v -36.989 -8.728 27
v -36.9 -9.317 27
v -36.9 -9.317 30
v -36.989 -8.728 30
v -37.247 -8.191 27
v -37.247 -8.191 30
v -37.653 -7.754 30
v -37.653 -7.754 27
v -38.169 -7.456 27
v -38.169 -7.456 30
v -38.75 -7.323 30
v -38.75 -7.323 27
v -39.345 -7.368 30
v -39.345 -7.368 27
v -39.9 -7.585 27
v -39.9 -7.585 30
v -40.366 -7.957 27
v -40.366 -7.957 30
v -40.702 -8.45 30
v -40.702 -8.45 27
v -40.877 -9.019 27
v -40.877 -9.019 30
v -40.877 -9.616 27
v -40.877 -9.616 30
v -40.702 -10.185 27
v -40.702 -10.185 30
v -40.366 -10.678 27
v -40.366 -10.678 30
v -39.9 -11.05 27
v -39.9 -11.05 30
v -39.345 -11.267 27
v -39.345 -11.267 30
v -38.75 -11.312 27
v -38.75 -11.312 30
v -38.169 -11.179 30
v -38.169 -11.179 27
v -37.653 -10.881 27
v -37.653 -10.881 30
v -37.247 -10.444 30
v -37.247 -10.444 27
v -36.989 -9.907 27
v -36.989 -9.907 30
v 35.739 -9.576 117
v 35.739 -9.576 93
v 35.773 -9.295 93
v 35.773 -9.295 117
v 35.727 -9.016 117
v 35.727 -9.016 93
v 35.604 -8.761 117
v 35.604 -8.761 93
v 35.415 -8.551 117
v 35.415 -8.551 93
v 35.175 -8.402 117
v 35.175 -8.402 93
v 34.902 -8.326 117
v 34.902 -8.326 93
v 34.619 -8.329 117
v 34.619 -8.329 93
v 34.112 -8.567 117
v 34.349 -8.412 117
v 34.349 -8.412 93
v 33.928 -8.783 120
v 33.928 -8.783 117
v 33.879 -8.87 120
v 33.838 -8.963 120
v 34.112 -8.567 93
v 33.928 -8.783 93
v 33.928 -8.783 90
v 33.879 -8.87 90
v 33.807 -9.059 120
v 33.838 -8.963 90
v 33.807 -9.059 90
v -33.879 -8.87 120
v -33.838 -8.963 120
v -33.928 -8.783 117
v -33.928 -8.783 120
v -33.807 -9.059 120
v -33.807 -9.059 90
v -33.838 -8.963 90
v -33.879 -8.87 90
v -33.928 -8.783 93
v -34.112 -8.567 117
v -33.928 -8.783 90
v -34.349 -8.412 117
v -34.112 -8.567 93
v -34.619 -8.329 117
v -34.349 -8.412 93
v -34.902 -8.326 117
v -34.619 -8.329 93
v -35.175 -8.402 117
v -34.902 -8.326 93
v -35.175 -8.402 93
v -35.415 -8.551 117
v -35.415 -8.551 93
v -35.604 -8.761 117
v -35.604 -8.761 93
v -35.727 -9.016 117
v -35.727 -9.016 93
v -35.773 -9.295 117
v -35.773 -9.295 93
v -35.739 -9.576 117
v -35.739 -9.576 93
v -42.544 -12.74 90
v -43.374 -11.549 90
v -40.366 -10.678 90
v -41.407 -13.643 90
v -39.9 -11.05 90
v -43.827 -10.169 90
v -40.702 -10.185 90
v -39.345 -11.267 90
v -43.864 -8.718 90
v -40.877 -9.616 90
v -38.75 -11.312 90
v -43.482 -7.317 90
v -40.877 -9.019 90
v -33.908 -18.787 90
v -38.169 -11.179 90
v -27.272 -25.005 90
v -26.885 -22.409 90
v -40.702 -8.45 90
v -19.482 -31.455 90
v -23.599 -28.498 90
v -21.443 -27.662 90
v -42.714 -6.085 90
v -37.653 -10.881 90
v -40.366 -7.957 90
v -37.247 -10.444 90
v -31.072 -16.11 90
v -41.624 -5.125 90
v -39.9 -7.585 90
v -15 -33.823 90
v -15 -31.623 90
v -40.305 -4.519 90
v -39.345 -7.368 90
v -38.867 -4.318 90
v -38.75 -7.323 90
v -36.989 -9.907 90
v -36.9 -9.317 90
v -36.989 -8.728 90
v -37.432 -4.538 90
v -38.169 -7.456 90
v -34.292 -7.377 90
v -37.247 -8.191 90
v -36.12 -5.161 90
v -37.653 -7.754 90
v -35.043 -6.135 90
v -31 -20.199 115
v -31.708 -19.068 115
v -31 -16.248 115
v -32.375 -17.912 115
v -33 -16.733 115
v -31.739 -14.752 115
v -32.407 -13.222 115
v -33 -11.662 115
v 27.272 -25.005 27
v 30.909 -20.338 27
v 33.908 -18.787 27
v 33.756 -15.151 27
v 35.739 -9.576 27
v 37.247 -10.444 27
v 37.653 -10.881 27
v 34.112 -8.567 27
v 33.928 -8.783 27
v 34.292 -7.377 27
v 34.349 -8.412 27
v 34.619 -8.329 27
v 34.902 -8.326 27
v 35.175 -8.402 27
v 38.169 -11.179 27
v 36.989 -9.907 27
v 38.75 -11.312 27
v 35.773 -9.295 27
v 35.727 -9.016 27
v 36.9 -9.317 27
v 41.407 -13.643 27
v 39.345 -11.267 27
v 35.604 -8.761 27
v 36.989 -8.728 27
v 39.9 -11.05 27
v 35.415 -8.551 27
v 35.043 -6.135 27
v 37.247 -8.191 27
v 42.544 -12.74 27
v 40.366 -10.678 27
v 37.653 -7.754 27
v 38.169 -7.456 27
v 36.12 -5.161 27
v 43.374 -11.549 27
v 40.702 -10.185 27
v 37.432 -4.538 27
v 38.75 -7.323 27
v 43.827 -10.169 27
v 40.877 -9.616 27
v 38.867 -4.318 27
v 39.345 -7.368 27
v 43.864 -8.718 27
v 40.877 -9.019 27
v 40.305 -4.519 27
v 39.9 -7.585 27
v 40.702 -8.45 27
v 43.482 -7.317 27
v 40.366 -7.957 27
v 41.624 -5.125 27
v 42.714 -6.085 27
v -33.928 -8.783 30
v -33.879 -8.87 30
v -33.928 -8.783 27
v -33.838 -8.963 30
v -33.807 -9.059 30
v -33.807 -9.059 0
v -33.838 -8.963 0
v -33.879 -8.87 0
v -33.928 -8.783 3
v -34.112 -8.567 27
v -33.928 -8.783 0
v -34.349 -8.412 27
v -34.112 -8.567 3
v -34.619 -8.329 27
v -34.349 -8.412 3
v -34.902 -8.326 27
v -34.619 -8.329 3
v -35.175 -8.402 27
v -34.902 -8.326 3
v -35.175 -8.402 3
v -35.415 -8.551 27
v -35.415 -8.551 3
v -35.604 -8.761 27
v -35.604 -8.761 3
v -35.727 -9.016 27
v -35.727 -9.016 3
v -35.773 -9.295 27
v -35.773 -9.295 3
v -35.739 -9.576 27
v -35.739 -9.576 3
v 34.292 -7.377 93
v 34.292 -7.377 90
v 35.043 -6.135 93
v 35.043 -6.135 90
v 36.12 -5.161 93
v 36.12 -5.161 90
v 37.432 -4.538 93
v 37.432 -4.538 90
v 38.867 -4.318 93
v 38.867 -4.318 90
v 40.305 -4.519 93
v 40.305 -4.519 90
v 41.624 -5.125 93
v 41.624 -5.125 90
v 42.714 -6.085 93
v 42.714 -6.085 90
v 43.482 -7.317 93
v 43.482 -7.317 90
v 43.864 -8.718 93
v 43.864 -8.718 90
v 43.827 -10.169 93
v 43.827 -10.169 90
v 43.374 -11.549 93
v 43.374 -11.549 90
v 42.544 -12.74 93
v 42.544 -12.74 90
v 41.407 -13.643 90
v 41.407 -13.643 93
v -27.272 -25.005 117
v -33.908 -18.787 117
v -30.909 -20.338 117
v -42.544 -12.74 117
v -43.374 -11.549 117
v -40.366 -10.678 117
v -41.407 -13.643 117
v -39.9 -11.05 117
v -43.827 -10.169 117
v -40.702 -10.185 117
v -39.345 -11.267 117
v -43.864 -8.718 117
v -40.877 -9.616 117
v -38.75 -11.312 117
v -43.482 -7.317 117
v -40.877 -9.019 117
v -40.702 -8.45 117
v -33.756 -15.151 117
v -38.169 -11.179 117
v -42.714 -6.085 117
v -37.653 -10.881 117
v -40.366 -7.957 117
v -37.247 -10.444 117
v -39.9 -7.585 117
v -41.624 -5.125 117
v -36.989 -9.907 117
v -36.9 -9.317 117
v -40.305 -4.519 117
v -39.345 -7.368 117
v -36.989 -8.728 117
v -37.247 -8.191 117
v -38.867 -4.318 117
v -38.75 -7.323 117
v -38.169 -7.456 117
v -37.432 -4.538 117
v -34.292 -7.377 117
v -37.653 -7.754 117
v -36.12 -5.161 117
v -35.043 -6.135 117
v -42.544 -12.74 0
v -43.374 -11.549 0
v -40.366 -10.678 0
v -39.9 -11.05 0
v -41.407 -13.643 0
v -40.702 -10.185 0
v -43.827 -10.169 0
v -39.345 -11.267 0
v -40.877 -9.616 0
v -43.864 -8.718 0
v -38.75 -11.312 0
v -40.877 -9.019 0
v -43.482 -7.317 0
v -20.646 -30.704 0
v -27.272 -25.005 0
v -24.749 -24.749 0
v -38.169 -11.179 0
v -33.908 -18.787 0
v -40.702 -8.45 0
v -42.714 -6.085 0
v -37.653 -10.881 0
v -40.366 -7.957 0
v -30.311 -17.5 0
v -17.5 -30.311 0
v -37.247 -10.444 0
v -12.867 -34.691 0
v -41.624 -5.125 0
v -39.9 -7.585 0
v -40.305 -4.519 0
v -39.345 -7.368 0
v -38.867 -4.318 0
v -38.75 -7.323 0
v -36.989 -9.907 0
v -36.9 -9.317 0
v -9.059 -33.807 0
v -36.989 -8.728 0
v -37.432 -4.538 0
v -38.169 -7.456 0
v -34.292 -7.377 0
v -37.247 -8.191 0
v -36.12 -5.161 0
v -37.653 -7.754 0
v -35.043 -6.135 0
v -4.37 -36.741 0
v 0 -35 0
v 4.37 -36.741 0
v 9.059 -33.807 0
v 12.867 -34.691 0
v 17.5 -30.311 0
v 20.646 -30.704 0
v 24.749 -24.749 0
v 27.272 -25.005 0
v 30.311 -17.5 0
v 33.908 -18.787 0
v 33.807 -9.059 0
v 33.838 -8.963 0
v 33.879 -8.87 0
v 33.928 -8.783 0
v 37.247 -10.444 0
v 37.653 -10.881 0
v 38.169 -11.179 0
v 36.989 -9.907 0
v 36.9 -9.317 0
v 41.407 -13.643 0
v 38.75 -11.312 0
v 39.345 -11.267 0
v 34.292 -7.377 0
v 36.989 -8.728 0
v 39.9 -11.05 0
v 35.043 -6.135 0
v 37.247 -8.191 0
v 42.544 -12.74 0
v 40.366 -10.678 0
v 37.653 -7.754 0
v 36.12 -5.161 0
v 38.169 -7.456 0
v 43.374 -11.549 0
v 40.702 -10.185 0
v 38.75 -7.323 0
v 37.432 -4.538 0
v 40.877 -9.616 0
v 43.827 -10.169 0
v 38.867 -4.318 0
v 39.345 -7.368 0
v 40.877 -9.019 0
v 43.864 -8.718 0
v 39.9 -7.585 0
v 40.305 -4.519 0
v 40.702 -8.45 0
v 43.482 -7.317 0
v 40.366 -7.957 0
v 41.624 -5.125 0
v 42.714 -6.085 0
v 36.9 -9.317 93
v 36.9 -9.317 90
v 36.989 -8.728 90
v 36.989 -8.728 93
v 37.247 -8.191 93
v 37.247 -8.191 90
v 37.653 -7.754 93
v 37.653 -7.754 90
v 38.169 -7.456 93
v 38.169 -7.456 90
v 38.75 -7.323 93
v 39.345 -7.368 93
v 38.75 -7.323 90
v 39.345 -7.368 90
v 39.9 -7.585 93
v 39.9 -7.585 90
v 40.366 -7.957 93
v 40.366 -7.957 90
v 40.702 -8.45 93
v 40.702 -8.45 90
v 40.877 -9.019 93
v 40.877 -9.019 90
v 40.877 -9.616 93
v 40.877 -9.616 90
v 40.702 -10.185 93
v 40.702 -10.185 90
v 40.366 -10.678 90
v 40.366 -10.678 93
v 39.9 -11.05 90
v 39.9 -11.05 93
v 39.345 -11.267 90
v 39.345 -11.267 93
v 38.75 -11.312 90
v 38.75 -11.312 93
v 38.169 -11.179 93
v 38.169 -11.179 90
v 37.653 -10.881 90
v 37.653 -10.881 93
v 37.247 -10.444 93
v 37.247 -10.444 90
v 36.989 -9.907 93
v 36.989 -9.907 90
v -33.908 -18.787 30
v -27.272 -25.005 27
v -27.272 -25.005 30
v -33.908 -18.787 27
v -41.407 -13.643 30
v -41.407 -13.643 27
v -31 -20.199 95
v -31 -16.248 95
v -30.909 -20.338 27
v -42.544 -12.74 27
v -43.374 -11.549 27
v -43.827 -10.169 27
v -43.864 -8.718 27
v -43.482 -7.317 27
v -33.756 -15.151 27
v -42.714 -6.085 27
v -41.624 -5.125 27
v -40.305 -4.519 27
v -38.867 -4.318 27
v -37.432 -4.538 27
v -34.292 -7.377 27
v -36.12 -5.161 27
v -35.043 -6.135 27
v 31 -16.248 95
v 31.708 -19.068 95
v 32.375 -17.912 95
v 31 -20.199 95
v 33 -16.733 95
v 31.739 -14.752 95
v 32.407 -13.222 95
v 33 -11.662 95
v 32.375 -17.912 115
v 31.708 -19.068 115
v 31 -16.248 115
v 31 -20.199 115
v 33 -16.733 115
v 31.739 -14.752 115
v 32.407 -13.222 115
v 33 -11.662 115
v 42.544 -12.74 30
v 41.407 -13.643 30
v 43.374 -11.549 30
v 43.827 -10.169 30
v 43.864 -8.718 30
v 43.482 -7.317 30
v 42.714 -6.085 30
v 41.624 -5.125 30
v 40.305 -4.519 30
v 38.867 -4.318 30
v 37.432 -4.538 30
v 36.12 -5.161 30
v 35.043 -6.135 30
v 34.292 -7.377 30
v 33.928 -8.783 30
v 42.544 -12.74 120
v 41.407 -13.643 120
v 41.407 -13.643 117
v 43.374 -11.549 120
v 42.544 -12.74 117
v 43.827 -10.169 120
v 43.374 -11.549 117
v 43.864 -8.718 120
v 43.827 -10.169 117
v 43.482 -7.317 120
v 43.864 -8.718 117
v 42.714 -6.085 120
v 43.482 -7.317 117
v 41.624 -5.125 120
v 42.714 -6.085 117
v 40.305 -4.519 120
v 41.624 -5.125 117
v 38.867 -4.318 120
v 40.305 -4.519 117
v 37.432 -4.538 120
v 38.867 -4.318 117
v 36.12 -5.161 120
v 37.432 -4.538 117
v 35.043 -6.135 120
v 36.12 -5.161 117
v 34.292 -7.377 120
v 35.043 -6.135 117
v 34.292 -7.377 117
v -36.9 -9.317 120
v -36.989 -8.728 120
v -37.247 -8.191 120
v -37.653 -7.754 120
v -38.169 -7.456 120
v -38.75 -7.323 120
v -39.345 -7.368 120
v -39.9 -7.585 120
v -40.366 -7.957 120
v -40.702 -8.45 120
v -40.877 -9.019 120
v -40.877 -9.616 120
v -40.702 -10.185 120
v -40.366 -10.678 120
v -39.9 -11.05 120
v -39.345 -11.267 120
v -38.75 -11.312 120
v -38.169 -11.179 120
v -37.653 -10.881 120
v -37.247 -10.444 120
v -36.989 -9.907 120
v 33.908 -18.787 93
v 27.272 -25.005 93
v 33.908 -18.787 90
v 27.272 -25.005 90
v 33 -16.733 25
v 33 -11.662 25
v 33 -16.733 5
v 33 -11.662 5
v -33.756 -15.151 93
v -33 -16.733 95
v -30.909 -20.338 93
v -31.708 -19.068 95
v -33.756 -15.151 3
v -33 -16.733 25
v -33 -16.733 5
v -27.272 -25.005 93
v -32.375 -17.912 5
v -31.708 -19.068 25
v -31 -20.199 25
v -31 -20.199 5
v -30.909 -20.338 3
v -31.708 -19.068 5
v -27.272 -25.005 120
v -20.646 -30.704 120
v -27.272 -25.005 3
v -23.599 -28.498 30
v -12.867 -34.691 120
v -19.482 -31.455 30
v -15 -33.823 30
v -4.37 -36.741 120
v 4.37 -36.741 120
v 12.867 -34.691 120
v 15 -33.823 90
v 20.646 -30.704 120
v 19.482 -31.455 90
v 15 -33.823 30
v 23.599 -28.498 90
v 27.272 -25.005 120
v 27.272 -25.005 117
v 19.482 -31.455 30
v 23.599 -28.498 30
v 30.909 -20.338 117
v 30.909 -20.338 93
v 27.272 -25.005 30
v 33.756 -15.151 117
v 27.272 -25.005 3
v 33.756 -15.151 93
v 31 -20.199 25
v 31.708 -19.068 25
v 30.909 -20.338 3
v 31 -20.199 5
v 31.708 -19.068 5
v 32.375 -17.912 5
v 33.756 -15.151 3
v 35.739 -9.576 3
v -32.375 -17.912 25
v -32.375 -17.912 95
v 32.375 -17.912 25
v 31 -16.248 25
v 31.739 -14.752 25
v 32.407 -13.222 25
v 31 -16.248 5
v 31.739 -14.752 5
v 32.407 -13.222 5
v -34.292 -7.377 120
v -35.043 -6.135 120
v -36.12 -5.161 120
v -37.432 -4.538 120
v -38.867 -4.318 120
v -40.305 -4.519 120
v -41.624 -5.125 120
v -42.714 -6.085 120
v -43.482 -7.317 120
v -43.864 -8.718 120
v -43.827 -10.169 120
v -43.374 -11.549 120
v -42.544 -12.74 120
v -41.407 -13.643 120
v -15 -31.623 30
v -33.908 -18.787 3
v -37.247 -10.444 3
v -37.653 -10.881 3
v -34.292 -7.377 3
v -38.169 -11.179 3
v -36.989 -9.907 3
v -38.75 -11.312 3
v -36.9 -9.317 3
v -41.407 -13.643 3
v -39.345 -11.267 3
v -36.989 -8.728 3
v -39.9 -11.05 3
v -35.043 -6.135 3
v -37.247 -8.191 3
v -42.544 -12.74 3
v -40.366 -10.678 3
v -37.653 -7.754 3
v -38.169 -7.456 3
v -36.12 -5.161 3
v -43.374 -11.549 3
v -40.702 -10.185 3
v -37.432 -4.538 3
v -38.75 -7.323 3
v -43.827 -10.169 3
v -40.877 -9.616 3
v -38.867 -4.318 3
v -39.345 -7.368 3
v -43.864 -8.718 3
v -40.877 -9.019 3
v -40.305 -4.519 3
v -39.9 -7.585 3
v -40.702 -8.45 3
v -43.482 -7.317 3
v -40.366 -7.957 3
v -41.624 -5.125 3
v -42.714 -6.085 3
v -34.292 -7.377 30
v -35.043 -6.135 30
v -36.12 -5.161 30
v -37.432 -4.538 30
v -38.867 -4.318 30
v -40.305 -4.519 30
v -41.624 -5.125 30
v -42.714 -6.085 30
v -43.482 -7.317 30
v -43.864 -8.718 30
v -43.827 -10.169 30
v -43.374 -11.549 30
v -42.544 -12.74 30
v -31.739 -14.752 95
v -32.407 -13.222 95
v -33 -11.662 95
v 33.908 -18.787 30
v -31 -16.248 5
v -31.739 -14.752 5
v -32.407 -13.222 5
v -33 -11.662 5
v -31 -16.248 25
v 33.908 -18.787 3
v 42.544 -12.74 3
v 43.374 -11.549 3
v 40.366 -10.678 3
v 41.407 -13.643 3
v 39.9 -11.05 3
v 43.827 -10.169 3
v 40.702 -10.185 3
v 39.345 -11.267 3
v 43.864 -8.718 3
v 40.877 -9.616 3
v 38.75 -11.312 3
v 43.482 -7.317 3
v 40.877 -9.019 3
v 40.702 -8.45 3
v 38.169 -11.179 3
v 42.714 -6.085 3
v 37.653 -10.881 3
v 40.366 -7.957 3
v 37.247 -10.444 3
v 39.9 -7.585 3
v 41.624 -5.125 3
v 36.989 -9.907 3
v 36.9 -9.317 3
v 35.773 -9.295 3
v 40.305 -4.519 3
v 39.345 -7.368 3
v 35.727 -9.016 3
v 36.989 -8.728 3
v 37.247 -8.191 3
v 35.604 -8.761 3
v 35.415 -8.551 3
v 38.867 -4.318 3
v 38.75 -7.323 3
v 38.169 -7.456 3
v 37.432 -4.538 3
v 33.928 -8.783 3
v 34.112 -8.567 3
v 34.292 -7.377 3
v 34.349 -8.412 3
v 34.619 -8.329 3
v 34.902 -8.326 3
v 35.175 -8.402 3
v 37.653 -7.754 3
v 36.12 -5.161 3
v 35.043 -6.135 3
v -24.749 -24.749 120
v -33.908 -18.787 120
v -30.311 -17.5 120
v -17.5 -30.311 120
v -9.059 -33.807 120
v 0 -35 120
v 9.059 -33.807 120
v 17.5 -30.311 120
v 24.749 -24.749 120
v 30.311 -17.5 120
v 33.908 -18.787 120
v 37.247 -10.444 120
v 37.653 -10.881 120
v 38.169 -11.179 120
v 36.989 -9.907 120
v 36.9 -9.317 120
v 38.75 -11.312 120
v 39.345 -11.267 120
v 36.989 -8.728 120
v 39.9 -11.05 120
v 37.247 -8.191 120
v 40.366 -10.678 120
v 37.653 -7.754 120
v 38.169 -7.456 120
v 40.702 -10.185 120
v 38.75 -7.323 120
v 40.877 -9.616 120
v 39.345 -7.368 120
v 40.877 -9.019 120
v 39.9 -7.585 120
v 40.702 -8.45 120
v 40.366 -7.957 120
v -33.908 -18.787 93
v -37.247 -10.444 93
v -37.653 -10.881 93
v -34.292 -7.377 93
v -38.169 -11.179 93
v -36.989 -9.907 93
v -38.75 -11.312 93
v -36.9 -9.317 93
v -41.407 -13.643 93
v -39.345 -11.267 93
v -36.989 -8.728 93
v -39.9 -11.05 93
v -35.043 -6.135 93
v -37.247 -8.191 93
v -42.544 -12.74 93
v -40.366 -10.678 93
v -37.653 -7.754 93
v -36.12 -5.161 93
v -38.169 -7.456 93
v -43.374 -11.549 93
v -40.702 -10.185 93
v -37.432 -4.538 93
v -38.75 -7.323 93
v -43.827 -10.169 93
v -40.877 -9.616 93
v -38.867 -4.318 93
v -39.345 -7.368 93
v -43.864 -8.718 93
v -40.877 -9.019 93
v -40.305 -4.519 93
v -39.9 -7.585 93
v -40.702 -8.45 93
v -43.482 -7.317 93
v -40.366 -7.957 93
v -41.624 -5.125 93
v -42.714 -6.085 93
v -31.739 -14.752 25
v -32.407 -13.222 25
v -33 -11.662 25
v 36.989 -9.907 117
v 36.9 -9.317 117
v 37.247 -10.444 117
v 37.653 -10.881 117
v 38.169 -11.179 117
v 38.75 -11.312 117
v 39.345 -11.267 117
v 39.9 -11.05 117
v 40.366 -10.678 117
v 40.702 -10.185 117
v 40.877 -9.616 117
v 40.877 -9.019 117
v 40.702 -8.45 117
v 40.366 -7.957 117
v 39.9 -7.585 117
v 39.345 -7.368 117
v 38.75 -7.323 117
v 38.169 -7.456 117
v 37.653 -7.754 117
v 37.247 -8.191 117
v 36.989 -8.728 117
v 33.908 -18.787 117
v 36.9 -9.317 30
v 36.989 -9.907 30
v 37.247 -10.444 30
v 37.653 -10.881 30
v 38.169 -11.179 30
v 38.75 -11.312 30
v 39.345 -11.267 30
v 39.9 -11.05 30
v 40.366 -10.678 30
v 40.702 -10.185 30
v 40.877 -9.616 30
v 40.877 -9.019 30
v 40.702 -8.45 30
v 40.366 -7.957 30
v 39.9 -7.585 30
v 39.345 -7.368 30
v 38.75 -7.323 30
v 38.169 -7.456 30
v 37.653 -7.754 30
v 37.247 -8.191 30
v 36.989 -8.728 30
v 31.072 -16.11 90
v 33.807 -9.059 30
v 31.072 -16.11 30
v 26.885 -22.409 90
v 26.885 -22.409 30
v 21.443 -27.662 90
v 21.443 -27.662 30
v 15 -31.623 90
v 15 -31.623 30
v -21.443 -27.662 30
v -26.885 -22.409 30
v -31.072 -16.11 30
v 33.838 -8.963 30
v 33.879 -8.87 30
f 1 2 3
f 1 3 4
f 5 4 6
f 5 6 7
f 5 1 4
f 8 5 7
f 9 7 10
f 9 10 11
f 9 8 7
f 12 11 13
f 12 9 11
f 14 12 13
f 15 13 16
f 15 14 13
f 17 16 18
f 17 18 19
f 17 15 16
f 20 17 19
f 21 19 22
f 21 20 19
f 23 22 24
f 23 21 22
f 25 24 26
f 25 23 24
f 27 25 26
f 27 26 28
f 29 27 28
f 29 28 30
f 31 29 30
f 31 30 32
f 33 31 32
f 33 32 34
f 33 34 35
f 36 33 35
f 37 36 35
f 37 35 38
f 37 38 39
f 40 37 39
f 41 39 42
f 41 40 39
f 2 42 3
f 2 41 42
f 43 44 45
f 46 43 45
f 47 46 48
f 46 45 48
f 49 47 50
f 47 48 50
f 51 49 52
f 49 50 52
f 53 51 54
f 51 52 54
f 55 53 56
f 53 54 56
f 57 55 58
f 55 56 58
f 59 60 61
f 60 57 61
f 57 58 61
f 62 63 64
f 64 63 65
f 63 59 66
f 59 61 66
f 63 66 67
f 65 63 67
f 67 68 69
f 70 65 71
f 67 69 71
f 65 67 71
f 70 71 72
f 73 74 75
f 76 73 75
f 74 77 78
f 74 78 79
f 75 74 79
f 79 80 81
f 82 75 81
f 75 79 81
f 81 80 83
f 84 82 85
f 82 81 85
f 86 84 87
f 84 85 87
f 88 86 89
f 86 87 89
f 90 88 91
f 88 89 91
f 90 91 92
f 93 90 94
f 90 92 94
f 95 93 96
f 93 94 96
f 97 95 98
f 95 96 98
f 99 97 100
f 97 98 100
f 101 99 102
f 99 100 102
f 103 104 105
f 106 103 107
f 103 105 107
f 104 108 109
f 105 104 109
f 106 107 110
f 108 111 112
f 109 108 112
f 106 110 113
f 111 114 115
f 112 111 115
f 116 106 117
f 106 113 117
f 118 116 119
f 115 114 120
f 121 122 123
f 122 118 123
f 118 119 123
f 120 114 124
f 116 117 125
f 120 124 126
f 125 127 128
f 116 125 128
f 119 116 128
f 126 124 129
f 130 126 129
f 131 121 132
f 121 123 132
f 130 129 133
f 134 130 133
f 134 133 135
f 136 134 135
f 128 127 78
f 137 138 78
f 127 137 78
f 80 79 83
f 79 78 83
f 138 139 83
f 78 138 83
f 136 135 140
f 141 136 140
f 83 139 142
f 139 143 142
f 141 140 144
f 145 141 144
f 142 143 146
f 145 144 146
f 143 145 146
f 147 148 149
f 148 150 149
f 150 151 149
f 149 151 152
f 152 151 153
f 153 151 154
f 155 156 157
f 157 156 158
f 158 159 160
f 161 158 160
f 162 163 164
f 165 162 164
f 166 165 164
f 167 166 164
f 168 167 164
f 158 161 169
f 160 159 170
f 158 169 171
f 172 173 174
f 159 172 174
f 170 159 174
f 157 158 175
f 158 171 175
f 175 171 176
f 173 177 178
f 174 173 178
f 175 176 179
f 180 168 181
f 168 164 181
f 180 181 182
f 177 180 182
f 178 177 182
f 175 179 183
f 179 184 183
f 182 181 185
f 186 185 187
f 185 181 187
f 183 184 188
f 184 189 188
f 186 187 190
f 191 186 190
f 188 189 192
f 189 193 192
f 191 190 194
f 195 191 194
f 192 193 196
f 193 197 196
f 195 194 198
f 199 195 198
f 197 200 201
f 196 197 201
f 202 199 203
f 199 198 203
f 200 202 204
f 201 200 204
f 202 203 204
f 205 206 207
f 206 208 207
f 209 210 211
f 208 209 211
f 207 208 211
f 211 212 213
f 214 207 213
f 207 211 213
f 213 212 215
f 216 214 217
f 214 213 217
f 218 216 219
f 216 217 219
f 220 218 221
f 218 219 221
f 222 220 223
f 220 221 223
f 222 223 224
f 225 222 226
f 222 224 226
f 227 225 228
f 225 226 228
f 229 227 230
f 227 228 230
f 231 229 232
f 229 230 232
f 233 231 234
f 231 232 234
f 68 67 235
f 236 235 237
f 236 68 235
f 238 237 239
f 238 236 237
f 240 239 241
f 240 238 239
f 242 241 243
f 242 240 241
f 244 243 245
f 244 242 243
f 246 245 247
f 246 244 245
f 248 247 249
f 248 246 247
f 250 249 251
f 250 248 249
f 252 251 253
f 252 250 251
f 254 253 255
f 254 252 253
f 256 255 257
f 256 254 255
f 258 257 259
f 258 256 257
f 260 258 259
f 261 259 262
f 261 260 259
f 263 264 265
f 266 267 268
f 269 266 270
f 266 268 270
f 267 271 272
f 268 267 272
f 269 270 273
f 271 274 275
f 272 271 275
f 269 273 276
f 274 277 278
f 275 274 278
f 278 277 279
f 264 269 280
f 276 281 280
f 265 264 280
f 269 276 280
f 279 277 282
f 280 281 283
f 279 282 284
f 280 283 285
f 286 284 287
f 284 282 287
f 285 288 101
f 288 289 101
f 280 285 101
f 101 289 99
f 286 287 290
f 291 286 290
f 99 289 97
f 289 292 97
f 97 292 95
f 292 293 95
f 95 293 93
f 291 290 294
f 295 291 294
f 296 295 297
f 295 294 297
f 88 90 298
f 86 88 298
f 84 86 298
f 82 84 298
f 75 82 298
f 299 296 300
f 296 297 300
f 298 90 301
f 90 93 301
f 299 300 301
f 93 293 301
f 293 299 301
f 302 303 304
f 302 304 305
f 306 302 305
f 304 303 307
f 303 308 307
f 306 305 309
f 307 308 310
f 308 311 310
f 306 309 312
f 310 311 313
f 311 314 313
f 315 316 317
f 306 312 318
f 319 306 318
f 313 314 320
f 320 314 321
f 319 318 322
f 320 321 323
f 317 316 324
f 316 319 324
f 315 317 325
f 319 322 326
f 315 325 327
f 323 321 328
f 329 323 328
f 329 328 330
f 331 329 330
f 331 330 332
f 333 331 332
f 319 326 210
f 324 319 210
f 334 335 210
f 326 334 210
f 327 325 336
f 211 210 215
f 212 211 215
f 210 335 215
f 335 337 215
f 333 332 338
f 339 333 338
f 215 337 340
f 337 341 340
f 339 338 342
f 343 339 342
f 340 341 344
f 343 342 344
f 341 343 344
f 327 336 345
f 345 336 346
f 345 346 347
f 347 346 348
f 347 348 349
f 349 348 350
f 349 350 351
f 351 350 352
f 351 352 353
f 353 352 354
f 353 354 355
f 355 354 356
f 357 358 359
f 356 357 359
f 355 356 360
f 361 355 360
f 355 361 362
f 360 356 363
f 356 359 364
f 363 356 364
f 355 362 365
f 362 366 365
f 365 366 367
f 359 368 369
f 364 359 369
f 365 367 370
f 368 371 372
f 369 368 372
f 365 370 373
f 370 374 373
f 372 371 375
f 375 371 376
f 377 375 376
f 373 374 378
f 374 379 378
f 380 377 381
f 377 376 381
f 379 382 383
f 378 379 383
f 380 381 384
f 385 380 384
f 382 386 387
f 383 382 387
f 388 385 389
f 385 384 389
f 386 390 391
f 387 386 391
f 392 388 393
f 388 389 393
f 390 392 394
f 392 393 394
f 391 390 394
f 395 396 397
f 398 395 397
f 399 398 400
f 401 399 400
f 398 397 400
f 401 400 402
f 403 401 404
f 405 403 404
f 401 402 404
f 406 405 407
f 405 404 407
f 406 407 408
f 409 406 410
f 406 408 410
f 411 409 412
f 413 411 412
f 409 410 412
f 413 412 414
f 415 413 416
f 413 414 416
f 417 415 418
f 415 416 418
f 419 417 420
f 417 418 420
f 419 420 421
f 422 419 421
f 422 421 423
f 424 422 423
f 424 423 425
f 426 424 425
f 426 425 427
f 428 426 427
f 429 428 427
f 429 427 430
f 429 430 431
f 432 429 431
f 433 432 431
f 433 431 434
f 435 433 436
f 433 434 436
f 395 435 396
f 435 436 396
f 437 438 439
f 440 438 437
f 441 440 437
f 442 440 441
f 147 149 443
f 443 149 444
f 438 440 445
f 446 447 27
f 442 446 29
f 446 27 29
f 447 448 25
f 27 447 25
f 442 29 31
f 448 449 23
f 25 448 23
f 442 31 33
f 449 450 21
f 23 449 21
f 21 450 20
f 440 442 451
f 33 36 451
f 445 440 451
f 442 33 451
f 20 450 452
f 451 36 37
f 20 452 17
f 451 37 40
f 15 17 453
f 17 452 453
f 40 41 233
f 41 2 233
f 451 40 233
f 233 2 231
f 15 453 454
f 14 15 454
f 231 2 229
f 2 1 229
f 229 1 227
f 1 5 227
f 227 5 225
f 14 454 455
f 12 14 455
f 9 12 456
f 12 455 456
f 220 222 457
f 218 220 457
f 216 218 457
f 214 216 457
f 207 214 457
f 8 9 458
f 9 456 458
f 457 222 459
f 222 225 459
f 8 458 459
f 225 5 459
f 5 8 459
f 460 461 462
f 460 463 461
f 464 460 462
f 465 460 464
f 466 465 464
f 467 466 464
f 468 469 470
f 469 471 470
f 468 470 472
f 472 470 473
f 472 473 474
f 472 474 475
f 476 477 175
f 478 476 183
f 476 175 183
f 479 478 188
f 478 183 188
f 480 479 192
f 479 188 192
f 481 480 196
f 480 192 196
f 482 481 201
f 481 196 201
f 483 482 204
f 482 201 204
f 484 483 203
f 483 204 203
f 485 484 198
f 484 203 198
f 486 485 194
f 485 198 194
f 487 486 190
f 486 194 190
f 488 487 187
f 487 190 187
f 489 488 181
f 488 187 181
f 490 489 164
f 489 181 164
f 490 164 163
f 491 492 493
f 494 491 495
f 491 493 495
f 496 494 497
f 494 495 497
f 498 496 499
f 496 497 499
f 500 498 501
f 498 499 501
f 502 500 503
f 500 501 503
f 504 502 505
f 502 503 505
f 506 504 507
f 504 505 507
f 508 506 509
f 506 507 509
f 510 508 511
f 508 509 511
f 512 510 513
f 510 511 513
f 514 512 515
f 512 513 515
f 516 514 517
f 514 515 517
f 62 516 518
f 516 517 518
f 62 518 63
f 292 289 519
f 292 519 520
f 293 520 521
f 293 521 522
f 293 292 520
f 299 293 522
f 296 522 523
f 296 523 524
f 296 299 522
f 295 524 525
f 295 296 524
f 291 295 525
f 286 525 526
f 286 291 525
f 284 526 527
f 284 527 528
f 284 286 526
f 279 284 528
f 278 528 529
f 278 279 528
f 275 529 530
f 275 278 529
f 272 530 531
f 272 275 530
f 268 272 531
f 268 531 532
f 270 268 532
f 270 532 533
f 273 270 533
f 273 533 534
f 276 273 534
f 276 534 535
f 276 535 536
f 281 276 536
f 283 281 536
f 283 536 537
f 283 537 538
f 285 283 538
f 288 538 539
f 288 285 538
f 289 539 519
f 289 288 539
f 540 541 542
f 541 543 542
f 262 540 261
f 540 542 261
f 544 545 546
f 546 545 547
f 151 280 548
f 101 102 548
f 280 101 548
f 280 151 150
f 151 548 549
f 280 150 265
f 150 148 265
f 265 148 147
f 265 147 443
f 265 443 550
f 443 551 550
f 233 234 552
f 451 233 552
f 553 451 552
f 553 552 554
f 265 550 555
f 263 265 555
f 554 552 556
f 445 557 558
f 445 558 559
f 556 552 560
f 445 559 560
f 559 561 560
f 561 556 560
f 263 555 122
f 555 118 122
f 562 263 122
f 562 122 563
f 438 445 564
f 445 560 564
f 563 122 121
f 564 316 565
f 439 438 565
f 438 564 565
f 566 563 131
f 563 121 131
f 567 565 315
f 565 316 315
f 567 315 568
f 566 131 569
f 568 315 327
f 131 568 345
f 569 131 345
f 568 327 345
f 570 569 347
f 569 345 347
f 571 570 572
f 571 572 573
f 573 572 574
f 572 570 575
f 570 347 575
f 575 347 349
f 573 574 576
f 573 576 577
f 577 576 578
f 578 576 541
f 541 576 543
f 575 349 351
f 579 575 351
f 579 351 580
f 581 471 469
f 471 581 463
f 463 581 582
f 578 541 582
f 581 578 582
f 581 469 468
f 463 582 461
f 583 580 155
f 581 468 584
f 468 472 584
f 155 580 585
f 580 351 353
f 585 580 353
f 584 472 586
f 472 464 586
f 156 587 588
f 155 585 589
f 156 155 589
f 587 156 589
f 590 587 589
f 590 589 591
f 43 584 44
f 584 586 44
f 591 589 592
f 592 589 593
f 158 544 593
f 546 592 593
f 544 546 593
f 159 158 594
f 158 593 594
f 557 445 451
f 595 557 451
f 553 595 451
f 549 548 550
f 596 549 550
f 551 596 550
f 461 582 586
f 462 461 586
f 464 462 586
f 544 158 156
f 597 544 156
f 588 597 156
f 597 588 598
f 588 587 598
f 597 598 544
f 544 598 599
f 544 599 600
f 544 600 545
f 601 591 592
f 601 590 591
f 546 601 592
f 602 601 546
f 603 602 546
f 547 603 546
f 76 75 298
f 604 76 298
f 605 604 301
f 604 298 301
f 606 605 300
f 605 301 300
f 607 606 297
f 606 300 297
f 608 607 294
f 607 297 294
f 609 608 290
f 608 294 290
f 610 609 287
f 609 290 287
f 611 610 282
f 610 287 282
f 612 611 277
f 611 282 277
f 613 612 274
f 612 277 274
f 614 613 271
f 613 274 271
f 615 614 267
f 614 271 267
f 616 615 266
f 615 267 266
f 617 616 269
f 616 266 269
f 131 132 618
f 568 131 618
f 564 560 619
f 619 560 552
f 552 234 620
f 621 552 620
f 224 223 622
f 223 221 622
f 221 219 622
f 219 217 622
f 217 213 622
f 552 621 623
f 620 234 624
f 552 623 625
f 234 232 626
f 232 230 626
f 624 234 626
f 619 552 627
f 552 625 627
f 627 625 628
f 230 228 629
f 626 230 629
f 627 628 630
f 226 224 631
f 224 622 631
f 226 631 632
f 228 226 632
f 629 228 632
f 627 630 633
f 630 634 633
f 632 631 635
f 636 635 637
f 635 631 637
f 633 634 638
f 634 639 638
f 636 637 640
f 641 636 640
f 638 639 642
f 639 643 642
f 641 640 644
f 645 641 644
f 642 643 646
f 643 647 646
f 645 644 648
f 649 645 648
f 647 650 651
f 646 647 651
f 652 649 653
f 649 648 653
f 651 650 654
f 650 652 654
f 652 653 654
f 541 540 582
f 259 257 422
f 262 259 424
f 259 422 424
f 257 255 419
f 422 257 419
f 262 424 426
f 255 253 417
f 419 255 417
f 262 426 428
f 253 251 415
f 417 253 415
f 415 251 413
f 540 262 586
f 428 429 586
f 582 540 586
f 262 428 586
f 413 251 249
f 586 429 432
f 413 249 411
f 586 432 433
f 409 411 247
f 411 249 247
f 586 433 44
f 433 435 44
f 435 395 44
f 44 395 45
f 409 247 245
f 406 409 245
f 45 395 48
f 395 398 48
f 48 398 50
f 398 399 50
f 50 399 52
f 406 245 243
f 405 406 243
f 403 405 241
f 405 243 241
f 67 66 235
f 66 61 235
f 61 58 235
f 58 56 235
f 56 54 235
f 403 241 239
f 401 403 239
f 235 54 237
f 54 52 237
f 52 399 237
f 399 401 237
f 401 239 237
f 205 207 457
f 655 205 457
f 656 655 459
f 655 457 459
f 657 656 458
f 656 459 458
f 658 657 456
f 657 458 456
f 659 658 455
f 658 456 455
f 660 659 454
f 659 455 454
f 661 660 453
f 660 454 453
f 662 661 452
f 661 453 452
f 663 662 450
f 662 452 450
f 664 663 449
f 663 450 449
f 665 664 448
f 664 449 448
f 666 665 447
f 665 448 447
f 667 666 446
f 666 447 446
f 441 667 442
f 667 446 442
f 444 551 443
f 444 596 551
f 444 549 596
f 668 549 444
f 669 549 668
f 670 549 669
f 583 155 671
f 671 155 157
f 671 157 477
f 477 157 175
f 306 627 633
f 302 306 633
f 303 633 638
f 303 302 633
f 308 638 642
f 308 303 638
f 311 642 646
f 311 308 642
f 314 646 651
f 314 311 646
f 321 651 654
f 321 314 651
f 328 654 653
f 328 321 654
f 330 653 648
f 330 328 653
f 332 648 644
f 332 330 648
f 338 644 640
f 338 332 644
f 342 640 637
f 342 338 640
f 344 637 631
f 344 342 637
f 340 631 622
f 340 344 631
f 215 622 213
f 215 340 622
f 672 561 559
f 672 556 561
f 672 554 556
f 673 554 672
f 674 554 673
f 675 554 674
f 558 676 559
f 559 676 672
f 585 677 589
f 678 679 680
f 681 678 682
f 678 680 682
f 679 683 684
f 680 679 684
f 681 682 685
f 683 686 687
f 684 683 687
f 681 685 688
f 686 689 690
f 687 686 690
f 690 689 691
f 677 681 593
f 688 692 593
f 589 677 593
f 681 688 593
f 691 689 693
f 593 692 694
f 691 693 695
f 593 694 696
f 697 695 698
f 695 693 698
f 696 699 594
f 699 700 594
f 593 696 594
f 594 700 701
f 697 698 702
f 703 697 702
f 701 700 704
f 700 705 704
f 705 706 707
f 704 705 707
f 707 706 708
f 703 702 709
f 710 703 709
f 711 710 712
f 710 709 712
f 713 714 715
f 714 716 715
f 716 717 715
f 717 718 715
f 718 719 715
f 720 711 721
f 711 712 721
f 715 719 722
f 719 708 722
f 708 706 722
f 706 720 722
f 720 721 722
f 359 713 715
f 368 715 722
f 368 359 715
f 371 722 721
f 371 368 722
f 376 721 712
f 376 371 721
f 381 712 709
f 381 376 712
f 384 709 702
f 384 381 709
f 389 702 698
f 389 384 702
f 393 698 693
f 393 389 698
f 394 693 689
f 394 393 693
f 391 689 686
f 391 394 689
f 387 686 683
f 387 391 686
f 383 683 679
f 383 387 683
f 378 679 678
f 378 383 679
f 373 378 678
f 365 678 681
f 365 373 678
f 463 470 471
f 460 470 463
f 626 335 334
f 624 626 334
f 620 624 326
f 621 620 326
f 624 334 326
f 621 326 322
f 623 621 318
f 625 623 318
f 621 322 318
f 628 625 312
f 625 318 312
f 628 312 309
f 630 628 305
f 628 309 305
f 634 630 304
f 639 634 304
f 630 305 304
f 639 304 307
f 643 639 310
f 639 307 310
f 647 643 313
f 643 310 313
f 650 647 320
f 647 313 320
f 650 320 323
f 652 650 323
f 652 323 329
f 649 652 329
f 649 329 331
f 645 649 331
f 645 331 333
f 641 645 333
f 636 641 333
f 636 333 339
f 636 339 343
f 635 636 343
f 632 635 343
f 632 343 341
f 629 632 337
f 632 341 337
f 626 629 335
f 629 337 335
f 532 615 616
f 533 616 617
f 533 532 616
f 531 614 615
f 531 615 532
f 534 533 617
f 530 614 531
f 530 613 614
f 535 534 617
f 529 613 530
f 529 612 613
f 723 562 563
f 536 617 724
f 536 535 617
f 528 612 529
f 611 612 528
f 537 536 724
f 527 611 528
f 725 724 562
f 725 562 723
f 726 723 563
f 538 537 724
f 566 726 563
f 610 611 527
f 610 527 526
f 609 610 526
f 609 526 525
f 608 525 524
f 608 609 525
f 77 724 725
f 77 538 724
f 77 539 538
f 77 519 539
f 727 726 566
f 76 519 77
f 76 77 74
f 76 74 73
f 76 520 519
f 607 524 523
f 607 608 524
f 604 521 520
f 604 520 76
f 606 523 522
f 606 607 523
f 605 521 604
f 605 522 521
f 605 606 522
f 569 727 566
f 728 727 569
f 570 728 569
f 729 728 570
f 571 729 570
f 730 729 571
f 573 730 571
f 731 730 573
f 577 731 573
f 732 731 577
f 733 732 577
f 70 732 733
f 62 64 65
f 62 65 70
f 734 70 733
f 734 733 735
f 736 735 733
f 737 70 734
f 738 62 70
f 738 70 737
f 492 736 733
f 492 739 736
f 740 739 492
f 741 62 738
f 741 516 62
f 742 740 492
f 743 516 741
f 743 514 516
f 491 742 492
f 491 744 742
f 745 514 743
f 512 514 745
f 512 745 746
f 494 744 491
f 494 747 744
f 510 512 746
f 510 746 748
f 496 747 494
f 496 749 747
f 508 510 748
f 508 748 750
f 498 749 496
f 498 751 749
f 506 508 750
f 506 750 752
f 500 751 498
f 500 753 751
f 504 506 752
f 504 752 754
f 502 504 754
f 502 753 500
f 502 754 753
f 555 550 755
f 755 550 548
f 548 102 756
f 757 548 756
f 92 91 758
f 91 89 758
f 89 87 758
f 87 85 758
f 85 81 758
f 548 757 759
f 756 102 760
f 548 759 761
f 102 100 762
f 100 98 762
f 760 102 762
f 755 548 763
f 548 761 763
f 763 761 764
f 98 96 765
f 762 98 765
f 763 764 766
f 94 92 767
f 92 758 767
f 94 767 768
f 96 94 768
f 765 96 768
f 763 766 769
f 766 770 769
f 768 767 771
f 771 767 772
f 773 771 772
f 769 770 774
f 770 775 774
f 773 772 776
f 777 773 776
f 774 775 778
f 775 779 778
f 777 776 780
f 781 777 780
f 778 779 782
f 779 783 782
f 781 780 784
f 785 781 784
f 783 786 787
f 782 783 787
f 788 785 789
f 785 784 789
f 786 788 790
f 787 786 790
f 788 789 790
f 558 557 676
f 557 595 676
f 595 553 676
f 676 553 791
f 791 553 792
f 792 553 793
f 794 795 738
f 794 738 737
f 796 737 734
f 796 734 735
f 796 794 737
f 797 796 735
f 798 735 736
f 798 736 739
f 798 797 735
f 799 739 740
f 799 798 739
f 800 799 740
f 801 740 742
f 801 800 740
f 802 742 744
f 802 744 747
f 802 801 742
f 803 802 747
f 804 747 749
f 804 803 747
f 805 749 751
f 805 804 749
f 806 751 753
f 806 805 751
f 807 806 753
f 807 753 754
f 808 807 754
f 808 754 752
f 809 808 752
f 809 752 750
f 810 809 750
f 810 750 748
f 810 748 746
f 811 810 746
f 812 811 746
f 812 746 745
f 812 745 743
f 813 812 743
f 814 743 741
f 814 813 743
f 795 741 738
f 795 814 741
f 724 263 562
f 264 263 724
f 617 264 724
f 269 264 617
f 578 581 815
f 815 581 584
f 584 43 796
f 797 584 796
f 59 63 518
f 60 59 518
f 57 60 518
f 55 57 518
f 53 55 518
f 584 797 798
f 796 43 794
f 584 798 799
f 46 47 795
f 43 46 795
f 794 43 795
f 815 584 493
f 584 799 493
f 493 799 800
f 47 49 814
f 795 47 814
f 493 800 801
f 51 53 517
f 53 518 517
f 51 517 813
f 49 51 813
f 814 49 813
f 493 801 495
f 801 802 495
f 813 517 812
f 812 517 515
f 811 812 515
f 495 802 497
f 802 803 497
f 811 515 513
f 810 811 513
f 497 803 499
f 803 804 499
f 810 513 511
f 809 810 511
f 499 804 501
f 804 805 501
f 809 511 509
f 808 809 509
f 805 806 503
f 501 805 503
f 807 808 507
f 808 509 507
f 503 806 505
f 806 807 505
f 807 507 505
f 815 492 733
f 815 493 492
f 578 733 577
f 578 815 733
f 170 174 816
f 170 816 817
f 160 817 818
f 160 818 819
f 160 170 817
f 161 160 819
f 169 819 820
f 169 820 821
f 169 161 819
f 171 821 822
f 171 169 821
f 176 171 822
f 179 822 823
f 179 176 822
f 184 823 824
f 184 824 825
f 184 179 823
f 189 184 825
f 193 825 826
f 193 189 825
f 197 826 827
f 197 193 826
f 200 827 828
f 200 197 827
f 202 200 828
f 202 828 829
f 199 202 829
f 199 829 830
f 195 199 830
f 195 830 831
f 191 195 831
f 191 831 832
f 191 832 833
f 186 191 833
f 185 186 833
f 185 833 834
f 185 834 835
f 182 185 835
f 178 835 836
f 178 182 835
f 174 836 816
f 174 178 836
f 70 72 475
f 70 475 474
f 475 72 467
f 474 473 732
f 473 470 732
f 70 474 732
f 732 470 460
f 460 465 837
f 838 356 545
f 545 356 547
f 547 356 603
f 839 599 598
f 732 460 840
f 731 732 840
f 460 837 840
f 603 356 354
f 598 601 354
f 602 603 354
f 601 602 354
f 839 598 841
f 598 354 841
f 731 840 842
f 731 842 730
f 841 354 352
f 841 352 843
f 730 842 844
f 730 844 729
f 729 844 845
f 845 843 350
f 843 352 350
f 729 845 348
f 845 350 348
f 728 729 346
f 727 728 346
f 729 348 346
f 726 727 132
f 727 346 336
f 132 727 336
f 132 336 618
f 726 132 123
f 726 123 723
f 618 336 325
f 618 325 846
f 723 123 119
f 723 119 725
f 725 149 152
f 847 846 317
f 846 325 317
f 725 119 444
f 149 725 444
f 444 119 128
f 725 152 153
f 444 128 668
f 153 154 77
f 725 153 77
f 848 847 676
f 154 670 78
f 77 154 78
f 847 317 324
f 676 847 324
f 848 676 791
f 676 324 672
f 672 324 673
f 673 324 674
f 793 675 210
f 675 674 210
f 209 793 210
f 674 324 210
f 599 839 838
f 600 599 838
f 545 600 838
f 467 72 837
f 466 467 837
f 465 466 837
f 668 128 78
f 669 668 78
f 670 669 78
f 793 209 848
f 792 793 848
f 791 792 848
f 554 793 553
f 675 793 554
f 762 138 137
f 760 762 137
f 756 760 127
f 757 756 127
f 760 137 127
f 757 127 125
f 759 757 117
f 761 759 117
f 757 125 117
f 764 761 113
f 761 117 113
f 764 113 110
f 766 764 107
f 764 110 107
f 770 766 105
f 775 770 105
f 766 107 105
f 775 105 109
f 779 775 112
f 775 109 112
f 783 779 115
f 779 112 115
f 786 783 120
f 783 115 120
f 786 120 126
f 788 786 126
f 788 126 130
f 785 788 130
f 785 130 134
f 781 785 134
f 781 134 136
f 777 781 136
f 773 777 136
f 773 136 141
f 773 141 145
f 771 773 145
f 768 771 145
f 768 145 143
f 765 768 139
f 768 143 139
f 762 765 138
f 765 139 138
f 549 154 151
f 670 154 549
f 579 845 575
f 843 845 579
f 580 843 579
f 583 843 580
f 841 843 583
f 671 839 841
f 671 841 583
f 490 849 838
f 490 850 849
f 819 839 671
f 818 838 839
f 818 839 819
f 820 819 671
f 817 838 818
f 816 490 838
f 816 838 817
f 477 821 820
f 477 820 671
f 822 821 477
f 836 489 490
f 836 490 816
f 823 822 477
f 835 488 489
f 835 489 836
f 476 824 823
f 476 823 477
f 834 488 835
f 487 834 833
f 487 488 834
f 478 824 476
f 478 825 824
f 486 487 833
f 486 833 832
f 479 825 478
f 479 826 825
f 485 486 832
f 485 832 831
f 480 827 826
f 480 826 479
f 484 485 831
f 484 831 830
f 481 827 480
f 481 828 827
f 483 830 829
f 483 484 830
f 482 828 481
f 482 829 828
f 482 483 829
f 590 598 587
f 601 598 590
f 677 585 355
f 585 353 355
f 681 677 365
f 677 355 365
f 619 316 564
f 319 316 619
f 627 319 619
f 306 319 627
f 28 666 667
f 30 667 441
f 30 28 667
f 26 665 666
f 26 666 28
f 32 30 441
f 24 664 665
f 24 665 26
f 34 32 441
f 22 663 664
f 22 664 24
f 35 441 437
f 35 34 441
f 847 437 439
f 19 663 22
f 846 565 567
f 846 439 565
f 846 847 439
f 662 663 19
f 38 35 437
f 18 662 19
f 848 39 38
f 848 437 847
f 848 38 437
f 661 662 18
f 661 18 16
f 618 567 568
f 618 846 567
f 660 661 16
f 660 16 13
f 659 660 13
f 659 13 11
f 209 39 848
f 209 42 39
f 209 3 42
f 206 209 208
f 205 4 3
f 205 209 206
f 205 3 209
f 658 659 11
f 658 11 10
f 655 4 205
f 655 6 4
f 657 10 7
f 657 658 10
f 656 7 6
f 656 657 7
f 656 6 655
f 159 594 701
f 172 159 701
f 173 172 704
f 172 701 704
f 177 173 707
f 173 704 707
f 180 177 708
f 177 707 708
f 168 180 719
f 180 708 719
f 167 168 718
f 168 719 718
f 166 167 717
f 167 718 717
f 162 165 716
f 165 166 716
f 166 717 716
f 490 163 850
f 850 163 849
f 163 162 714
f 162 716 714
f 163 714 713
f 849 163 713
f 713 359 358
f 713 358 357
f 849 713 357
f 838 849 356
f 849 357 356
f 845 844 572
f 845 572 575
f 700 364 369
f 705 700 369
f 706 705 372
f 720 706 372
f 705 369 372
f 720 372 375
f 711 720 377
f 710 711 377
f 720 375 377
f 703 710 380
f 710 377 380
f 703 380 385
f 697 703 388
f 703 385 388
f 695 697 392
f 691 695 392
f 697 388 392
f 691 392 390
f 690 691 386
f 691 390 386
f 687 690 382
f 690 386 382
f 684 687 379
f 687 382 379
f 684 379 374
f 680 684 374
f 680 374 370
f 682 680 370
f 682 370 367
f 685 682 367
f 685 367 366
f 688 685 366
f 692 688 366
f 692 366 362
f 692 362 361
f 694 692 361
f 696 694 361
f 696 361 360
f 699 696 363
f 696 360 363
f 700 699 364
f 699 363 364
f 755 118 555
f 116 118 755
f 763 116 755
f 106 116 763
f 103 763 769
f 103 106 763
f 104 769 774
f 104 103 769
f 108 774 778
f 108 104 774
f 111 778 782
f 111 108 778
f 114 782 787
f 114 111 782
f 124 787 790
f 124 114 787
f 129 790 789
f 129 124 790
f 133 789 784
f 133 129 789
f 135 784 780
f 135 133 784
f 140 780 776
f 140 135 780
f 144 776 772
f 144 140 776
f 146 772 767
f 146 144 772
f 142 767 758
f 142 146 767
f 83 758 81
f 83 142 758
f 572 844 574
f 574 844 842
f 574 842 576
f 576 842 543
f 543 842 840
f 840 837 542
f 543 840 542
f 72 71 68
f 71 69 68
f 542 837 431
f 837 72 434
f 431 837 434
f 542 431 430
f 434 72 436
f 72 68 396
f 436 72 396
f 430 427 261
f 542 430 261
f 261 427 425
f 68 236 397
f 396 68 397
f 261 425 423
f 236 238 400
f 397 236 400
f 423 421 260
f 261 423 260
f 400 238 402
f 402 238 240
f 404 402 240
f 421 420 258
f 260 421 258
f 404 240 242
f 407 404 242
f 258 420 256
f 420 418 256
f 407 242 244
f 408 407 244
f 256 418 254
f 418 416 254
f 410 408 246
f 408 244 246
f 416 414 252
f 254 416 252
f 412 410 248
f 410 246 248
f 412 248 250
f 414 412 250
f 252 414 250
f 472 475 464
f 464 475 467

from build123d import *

# Parameters (mm, degrees)
BOSS_EXTRUDE1_DEPTH = 120
SKETCH2_W           = 40.109469753
SKETCH2_H           = 60
SKETCH2_W_2         = 2
SKETCH2_H_2         = 20
CUT_EXTRUDE1_DEPTH  = 120
SKETCH3_R           = 5
SKETCH3_R_2         = 2
BOSS_EXTRUDE2_DEPTH = 3
BOSS_EXTRUDE3_START = -3
SKETCH4_R           = 5
SKETCH4_R_2         = 2
BOSS_EXTRUDE3_DEPTH = 3
LPATTERN1_COUNT     = 2
LPATTERN1_PITCH     = 90
FILLET1_R           = 60


with BuildPart() as part:
    # Sketch1 → Boss-Extrude1 (new body)
    with BuildSketch(Plane.XY):
        with BuildLine():
            ThreePointArc((33.80740392, -9.058666579), (0, -35), (-33.80740392, -9.058666579))
            ThreePointArc((-33.80740392, -9.058666579), (-35.032148792, -8.351559797), (-35.739255573, -9.576304669))
            ThreePointArc((-35.739255573, -9.576304669), (0, -37), (35.739255573, -9.576304669))
            ThreePointArc((35.739255573, -9.576304669), (35.032148792, -8.351559797), (33.80740392, -9.058666579))
        make_face()
    extrude(amount=BOSS_EXTRUDE1_DEPTH)

    # Sketch2 → Cut-Extrude1 (cut)
    with BuildSketch(Plane(origin=(0, 0, 0), x_dir=(1, 0, 0), z_dir=(0, 1, 0))):
        with Locations((-35.054734877, -60)):
            Rectangle(SKETCH2_W, SKETCH2_H)
        with Locations((35.054734877, -60)):
            Rectangle(SKETCH2_W, SKETCH2_H)
        with Locations((32, -15)):
            Rectangle(SKETCH2_W_2, SKETCH2_H_2)
        with Locations((-32, -15)):
            Rectangle(SKETCH2_W_2, SKETCH2_H_2)
        with Locations((-32, -105)):
            Rectangle(SKETCH2_W_2, SKETCH2_H_2)
        with Locations((32, -105)):
            Rectangle(SKETCH2_W_2, SKETCH2_H_2)
    extrude(amount=-CUT_EXTRUDE1_DEPTH, mode=Mode.SUBTRACT)

    # Sketch3 → Boss-Extrude2 (add)
    # profile 1 of 2: a face of its own
    with BuildSketch(Plane(origin=(0, 0, 0), x_dir=(-1, 0, 0), z_dir=(0, 0, -1))):
        with Locations((-38.899671742, -9.317485624)):
            Circle(SKETCH3_R)
        with Locations((-38.899671742, -9.317485624)):
            Circle(SKETCH3_R_2, mode=Mode.SUBTRACT)
    # profile 2 of 2: a face of its own
    with BuildSketch(Plane(origin=(0, 0, 0), x_dir=(-1, 0, 0), z_dir=(0, 0, -1))):
        with Locations((38.899671742, -9.317485624)):
            Circle(SKETCH3_R)
        with Locations(Location((38.899671742, -9.317485624, 0), (0, 0, 180))):
            Circle(SKETCH3_R_2, mode=Mode.SUBTRACT)
    boss_extrude2 = extrude(amount=-BOSS_EXTRUDE2_DEPTH)

    # Sketch4 → Boss-Extrude3 (add)
    # profile 1 of 2: a face of its own
    with BuildSketch(Plane.XY.offset(30).offset(BOSS_EXTRUDE3_START)):
        with Locations((-38.899671742, -9.317485624)):
            Circle(SKETCH4_R)
        with Locations((-38.899671742, -9.317485624)):
            Circle(SKETCH4_R_2, mode=Mode.SUBTRACT)
    # profile 2 of 2: a face of its own
    with BuildSketch(Plane.XY.offset(30).offset(BOSS_EXTRUDE3_START)):
        with Locations((38.899671742, -9.317485624)):
            Circle(SKETCH4_R)
        with Locations(Location((38.899671742, -9.317485624, 0), (0, 0, 180))):
            Circle(SKETCH4_R_2, mode=Mode.SUBTRACT)
    boss_extrude3 = extrude(amount=BOSS_EXTRUDE3_DEPTH)

    # LPattern1: Boss-Extrude2, Boss-Extrude3 ×2
    with Locations(*[(0, 0, i * LPATTERN1_PITCH) for i in range(1, LPATTERN1_COUNT)]):
        add(boss_extrude2)
        add(boss_extrude3)

    # Fillet1
    fillet1_edges = [part.edges().sort_by_distance(p)[0] for p in [
        (34.892782732, -12.308278238, 1.5),
        (-34.892782732, -12.308278238, 1.5),
        (-34.892782732, -12.308278238, 28.5),
        (34.892782732, -12.308278238, 28.5),
        (34.892782732, -12.308278238, 91.5),
        (-34.892782732, -12.308278238, 91.5),
        (-34.892782732, -12.308278238, 118.5),
        (34.892782732, -12.308278238, 118.5),
    ]]
    fillet(fillet1_edges, radius=FILLET1_R)


solid = part.part
